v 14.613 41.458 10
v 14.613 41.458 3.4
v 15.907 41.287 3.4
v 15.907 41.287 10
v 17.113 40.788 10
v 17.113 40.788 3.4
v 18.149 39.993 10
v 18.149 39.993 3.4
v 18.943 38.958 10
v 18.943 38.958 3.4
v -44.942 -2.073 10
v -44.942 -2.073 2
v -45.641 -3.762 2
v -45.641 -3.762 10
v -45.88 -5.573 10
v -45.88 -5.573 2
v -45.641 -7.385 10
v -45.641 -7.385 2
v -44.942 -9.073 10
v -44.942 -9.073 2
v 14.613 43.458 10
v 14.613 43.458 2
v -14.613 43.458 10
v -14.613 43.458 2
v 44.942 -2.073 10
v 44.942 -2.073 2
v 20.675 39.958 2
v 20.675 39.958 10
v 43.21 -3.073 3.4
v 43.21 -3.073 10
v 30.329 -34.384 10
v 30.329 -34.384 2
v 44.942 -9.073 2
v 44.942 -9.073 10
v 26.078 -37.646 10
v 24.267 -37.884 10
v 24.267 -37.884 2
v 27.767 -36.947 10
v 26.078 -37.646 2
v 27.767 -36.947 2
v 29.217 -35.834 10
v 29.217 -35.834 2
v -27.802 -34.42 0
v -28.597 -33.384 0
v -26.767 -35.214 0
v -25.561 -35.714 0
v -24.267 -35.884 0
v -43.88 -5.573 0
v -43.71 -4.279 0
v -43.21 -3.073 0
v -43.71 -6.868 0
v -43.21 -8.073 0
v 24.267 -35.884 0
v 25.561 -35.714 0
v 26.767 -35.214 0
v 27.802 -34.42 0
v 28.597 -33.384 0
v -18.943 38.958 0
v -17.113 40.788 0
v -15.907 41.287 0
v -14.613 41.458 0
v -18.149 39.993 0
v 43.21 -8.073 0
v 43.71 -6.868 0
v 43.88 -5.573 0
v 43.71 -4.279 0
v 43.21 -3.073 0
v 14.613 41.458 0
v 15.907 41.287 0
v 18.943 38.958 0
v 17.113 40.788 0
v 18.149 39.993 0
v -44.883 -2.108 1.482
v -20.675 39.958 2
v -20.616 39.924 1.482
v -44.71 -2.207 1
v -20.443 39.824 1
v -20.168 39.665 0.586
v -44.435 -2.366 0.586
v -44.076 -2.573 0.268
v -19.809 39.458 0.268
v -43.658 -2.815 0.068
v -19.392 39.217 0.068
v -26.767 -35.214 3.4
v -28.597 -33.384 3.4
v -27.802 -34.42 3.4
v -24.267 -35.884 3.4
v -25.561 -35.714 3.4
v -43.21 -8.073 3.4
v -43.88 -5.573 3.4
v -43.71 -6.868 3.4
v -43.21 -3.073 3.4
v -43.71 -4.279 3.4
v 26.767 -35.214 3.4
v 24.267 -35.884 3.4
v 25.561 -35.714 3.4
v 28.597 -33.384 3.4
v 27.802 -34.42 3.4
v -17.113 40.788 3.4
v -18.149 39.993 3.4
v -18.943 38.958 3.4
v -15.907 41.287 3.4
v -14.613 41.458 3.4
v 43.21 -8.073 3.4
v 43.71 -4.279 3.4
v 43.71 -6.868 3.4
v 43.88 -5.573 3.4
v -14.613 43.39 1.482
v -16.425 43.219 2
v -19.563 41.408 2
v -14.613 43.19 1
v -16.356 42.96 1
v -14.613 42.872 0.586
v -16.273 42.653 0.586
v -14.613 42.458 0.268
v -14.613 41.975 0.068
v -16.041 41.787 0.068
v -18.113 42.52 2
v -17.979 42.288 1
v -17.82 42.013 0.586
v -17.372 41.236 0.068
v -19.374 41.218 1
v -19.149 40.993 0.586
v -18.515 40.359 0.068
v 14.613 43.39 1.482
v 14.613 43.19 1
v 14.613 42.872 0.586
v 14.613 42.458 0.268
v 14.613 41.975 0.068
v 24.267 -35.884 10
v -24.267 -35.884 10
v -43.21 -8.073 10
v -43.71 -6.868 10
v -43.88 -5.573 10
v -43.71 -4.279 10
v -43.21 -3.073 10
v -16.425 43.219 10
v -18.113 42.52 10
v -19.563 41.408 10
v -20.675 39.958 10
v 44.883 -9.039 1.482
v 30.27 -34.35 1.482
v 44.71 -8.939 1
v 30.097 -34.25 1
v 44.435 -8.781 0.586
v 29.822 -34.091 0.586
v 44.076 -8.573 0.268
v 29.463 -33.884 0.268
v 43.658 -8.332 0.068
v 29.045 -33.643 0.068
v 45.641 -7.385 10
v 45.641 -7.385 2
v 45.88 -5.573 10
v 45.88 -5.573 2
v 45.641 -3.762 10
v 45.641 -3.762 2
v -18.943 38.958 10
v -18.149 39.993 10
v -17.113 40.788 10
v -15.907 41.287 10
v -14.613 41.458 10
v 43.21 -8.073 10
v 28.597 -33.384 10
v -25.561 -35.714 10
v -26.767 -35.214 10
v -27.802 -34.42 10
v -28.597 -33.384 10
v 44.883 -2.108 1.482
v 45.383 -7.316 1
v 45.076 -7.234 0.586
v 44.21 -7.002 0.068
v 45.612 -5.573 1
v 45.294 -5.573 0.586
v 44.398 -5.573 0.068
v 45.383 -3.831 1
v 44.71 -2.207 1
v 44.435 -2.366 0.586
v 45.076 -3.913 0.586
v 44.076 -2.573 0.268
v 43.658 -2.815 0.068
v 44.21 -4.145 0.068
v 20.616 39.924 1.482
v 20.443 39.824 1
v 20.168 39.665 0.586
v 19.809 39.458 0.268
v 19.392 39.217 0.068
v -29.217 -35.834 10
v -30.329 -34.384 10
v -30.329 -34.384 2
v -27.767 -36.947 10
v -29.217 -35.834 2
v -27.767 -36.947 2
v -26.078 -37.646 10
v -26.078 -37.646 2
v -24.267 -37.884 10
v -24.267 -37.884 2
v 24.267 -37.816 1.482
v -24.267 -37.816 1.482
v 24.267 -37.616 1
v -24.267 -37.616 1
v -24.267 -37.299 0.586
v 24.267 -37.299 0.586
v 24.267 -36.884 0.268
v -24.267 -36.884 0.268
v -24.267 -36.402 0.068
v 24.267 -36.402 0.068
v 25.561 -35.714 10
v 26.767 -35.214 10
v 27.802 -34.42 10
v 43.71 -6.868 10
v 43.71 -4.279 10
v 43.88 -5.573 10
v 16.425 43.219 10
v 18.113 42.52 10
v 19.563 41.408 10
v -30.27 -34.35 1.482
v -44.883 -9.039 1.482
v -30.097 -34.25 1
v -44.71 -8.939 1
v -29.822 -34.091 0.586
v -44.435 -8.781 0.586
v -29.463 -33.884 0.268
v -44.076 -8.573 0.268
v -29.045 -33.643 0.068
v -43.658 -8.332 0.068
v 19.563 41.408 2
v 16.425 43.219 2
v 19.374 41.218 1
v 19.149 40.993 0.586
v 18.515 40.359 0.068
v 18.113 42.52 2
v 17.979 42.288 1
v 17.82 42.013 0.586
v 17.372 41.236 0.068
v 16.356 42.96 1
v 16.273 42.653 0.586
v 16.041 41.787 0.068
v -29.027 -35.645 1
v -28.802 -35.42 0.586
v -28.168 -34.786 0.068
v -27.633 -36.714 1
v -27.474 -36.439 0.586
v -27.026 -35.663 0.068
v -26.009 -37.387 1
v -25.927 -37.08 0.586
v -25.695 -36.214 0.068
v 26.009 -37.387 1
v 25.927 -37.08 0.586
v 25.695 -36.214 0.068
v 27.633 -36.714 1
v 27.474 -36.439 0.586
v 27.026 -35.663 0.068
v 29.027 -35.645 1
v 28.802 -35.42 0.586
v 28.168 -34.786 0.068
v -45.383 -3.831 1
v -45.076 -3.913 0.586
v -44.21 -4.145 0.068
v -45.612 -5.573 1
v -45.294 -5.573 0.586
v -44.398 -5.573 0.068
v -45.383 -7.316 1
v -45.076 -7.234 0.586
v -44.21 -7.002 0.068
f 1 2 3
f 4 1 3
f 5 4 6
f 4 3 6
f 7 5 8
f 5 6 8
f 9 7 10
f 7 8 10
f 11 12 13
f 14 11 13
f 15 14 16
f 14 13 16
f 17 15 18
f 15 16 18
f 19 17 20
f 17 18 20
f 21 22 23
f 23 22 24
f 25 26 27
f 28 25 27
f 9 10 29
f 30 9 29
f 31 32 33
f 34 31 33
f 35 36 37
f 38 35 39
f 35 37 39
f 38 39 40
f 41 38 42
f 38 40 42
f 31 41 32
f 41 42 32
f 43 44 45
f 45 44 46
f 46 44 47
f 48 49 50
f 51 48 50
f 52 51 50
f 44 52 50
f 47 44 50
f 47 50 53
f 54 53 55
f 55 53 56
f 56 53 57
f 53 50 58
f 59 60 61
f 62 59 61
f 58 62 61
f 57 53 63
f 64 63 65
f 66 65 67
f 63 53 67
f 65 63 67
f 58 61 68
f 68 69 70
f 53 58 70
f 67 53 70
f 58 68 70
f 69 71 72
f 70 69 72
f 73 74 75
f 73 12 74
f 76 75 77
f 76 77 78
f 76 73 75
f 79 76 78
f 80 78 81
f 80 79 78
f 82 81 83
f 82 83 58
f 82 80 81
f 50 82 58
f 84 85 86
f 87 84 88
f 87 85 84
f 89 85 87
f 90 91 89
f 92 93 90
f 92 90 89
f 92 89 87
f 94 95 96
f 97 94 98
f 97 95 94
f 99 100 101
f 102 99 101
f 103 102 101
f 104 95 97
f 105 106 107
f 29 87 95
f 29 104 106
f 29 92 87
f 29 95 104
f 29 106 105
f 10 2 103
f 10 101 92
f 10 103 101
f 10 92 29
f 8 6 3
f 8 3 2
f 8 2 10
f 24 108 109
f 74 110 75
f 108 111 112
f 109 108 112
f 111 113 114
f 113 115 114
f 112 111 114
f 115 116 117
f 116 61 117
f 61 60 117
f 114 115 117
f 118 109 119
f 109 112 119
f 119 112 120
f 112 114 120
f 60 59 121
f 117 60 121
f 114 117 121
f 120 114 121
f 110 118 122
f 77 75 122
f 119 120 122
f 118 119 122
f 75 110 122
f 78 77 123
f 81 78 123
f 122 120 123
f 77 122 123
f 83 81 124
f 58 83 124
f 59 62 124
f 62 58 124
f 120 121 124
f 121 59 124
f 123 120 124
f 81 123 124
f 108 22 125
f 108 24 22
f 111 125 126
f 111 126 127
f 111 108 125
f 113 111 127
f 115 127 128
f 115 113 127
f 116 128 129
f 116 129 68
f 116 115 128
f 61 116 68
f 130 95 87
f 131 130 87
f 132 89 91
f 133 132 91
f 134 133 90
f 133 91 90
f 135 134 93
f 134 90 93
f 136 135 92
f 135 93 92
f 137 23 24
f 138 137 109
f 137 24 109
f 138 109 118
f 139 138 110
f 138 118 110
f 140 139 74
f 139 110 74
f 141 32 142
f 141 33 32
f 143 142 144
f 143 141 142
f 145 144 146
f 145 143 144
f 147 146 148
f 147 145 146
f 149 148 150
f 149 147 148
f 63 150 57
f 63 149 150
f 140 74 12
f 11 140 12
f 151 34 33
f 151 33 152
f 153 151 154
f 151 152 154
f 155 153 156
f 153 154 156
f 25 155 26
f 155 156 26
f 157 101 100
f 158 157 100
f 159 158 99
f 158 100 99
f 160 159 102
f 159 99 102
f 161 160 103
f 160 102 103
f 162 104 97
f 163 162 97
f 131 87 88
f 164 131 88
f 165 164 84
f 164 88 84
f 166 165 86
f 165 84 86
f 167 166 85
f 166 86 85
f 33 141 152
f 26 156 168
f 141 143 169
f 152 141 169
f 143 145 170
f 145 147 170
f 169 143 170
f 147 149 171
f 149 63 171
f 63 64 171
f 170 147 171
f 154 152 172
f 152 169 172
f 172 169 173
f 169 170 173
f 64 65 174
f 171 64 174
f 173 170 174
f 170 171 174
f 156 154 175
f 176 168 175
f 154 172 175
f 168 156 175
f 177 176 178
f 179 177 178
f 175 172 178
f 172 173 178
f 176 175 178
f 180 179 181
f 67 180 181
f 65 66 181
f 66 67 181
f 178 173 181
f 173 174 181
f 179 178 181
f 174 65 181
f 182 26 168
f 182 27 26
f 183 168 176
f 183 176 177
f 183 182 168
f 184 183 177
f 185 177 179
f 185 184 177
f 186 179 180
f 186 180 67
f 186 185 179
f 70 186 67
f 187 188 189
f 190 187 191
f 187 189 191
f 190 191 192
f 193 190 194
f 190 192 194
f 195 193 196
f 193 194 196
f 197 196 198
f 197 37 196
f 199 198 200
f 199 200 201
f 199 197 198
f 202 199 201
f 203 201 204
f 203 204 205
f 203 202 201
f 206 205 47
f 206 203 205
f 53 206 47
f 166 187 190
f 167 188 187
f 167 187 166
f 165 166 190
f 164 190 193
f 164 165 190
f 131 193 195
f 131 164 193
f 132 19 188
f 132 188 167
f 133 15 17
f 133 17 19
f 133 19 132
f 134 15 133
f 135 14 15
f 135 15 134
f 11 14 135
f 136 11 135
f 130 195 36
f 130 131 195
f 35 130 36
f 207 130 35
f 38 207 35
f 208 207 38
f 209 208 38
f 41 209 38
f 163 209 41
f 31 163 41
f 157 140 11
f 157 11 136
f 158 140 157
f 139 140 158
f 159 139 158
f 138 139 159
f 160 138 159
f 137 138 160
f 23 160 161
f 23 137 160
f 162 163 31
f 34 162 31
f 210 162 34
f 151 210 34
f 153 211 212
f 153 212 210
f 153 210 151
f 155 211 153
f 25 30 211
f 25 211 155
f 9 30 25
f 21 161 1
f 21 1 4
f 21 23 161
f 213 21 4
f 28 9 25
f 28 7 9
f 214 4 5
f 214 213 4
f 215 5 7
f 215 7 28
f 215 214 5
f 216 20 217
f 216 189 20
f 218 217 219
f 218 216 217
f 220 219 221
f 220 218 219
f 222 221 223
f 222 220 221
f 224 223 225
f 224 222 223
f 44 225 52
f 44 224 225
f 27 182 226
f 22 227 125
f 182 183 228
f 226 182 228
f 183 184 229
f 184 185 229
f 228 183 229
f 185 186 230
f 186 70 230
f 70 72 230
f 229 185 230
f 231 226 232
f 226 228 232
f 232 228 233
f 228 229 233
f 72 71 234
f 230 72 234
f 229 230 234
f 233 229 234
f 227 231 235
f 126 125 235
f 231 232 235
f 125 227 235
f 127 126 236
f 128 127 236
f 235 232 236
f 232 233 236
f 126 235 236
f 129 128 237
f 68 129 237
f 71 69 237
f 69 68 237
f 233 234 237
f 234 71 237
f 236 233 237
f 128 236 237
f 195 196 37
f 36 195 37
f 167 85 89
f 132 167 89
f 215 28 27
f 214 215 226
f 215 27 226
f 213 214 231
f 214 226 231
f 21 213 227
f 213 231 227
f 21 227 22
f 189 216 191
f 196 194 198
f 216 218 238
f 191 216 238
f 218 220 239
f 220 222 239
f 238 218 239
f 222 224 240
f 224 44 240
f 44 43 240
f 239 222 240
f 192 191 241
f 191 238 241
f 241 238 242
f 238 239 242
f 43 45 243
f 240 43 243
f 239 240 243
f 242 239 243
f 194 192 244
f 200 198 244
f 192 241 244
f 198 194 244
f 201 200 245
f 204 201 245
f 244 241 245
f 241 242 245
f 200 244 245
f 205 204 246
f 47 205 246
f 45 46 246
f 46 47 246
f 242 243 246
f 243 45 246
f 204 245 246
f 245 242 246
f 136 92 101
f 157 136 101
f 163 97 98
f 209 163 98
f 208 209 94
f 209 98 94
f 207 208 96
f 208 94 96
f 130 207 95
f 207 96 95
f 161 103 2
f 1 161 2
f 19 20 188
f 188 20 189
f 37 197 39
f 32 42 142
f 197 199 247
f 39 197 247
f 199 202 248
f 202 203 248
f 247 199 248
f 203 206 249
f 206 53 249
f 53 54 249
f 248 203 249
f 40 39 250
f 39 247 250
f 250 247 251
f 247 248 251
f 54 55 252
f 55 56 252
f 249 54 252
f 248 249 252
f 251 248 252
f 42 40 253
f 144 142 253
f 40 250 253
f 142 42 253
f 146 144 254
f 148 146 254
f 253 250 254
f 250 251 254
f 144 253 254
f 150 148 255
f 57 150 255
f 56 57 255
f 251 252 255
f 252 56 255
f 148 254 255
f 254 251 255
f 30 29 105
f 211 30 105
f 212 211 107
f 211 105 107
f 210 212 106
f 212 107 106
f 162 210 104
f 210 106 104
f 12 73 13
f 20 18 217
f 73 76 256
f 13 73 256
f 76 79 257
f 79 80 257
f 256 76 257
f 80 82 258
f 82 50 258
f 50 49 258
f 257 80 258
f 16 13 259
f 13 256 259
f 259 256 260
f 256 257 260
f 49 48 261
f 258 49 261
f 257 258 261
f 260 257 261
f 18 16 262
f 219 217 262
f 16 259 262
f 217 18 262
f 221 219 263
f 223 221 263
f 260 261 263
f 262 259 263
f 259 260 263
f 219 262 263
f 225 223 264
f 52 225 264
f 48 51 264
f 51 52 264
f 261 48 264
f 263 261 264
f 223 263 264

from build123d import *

# Parameters (mm, degrees)
F1_DEPTH = 3.4
F2_DEPTH = 10
F3_R     = 2


with BuildPart() as f1:
    # F0 (on Top) → F1 (new body)
    with BuildSketch(Plane.XY):
        with BuildLine():
            ThreePointArc((18.943376, 38.95781), (17.113249, 40.787937), (14.613249, 41.45781))
            Line((14.613249, 41.45781), (-14.613249, 41.45781))
            ThreePointArc((-14.613249, 41.45781), (-17.113249, 40.787937), (-18.943376, 38.95781))
            Line((-18.943376, 38.95781), (-43.210141, -3.07346))
            ThreePointArc((-43.210141, -3.07346), (-43.880014, -5.57346), (-43.210141, -8.07346))
            Line((-43.210141, -8.07346), (-28.596892, -33.38435))
            ThreePointArc((-28.596892, -33.38435), (-26.766765, -35.214477), (-24.266765, -35.88435))
            Line((-24.266765, -35.88435), (24.266765, -35.88435))
            ThreePointArc((24.266765, -35.88435), (26.766765, -35.214477), (28.596892, -33.38435))
            Line((28.596892, -33.38435), (43.210141, -8.07346))
            ThreePointArc((43.210141, -8.07346), (43.880014, -5.57346), (43.210141, -3.07346))
            Line((43.210141, -3.07346), (18.943376, 38.95781))
        make_face()
    extrude(amount=F1_DEPTH)

    # F0 (on Top) → F2 (join)
    with BuildSketch(Plane.XY):
        with BuildLine():
            Line((44.942192, -2.07346), (20.675426, 39.95781))
            ThreePointArc((20.675426, 39.95781), (18.113249, 42.519988), (14.613249, 43.45781))
            Line((14.613249, 43.45781), (-14.613249, 43.45781))
            ThreePointArc((-14.613249, 43.45781), (-18.113249, 42.519988), (-20.675426, 39.95781))
            Line((-20.675426, 39.95781), (-44.942192, -2.07346))
            ThreePointArc((-44.942192, -2.07346), (-45.880014, -5.57346), (-44.942192, -9.07346))
            Line((-44.942192, -9.07346), (-30.328943, -34.38435))
            ThreePointArc((-30.328943, -34.38435), (-27.766765, -36.946527), (-24.266765, -37.88435))
            Line((-24.266765, -37.88435), (24.266765, -37.88435))
            ThreePointArc((24.266765, -37.88435), (27.766765, -36.946527), (30.328943, -34.38435))
            Line((30.328943, -34.38435), (44.942192, -9.07346))
            ThreePointArc((44.942192, -9.07346), (45.880014, -5.57346), (44.942192, -2.07346))
        make_face()
        with BuildLine():
            Line((-14.613249, 41.45781), (14.613249, 41.45781))
            ThreePointArc((14.613249, 41.45781), (17.113249, 40.787937), (18.943376, 38.95781))
            Line((18.943376, 38.95781), (43.210141, -3.07346))
            ThreePointArc((43.210141, -3.07346), (43.880014, -5.57346), (43.210141, -8.07346))
            Line((43.210141, -8.07346), (28.596892, -33.38435))
            ThreePointArc((28.596892, -33.38435), (26.766765, -35.214477), (24.266765, -35.88435))
            Line((24.266765, -35.88435), (-24.266765, -35.88435))
            ThreePointArc((-24.266765, -35.88435), (-26.766765, -35.214477), (-28.596892, -33.38435))
            Line((-28.596892, -33.38435), (-43.210141, -8.07346))
            ThreePointArc((-43.210141, -8.07346), (-43.880014, -5.57346), (-43.210141, -3.07346))
            Line((-43.210141, -3.07346), (-18.943376, 38.95781))
            ThreePointArc((-18.943376, 38.95781), (-17.113249, 40.787937), (-14.613249, 41.45781))
        make_face(mode=Mode.SUBTRACT)
    extrude(amount=F2_DEPTH)

    # F3
    f3_edges = [f1.edges().sort_by_distance(p)[0] for p in [
        (32.808809, 18.942175, 0),
    ]]
    fillet(f3_edges, radius=F3_R)


solid = f1.part
